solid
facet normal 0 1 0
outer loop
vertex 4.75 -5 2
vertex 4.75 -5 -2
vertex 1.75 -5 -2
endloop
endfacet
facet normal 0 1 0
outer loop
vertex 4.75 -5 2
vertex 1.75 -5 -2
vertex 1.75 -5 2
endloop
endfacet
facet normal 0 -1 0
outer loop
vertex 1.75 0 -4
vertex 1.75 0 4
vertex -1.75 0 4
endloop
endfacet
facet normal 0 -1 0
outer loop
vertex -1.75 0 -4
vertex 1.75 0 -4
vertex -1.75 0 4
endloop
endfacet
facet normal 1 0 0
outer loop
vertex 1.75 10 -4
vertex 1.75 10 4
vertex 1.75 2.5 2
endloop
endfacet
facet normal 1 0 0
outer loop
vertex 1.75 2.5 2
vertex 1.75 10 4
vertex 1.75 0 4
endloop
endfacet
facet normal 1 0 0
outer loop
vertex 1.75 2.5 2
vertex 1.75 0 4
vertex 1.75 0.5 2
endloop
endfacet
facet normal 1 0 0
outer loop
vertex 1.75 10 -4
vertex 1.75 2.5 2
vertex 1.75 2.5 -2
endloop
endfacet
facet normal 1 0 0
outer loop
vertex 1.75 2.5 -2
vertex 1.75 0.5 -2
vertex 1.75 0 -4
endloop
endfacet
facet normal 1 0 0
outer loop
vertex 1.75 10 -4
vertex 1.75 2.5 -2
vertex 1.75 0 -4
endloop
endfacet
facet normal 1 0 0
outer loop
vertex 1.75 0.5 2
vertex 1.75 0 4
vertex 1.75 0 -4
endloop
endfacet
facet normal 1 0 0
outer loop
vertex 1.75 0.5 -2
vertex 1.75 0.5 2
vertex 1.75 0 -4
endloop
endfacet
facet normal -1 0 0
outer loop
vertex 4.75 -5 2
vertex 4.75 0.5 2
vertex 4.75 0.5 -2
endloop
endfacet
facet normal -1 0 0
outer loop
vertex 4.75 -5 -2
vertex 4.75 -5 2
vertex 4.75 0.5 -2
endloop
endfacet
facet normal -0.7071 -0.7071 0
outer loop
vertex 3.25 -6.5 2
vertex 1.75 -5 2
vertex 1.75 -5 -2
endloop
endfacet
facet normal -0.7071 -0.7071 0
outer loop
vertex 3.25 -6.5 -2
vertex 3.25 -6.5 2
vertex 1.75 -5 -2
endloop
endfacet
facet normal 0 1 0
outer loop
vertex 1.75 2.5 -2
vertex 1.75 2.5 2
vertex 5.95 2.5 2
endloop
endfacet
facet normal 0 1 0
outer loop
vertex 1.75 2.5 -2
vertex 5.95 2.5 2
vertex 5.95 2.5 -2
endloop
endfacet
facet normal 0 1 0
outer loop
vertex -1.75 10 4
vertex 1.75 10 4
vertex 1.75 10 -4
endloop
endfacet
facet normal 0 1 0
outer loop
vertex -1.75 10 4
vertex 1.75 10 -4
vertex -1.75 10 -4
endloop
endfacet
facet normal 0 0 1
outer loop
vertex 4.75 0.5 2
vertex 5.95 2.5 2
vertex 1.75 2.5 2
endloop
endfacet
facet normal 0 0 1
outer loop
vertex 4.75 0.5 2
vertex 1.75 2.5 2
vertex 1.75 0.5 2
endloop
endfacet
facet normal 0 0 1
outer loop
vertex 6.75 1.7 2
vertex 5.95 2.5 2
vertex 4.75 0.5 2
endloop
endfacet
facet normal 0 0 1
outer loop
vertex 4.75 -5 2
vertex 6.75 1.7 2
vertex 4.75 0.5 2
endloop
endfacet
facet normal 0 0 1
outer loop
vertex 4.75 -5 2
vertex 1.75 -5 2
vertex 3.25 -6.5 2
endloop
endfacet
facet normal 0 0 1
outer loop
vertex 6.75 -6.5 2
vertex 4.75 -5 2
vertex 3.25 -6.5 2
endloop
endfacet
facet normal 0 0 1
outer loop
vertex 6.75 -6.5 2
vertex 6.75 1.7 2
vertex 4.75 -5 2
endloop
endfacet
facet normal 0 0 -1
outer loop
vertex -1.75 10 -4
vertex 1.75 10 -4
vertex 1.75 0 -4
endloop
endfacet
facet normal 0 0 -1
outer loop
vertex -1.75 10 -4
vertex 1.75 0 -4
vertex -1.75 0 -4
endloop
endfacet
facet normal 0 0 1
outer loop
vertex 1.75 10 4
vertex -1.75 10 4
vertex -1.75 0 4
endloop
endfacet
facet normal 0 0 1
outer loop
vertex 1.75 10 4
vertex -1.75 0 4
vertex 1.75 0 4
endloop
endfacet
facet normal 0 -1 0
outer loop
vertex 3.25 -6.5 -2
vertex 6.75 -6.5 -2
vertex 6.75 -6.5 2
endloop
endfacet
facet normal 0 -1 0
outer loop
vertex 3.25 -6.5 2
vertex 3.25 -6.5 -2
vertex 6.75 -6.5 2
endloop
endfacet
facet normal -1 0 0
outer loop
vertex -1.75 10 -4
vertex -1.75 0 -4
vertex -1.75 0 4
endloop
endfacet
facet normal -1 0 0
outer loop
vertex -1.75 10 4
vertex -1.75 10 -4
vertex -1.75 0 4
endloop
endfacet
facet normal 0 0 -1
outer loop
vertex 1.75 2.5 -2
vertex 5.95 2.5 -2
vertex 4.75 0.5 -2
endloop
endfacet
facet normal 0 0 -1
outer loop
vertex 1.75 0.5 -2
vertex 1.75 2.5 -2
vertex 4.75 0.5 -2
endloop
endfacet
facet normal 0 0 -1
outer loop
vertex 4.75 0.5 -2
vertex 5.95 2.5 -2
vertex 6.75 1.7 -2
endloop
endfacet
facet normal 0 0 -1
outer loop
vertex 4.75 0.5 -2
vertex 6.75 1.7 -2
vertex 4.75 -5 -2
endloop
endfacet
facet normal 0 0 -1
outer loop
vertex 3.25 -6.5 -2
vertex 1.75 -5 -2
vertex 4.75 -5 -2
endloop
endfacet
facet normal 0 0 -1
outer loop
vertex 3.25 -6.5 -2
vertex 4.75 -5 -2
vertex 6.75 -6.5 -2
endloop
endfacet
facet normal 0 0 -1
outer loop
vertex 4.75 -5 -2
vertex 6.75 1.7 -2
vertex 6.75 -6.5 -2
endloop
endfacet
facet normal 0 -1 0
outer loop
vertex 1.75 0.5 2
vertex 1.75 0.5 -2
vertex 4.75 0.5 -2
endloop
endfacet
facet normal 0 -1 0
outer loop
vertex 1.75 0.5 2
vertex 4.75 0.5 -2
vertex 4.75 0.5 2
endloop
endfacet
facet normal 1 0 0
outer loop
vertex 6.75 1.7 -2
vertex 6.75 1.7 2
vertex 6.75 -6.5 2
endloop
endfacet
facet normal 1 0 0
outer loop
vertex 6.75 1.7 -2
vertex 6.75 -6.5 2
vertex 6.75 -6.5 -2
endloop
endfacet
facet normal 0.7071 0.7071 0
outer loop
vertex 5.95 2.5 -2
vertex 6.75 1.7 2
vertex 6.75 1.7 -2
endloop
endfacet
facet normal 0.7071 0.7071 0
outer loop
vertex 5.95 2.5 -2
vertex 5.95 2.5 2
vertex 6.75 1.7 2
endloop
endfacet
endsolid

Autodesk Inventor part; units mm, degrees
ref_plane "YZ Plane" through (0, 0, 0) normal (1, 0, 0) x (0, 1, 0)
ref_plane "XZ Plane" through (0, 0, 0) normal (0, 1, 0) x (-1, 0, 0)
ref_plane "XY Plane" through (0, 0, 0) normal (0, 0, 1) x (1, 0, 0)
sketch "Sketch1" plane through (0, 0, 0) normal (0, 1, 0) x (-1, 0, 0)
  line L0 (-1.75, -4) -> (1.75, -4)
  line L1 (1.75, -4) -> (1.75, 4)
  line L2 (1.75, 4) -> (-1.75, 4)
  line L3 (-1.75, 4) -> (-1.75, -4)
  line L4 (-1.75, -4) -> (1.75, 4) construction
  line L5 (1.75, -4) -> (-1.75, 4) construction
  point P0 (0, 0)
  dimension "d0" = 3.5
  dimension "d1" = 8
extrude "Extrusion1" add sketch "Sketch1" along normal blind 10
sketch "Sketch2" plane through (1.75, 0, 4) normal (1, 0, 0) x (0, 0, -1)
  line L0 (2, 2.5) -> (6, 2.5)
  line L1 (6, 2.5) -> (6, 0.5)
  line L2 (6, 0.5) -> (2, 0.5)
  line L3 (2, 0.5) -> (2, 2.5)
  line L4 (8, 0) -> (8, 10) projected
  line L5 (0, 0) -> (8, 0) projected
  point P0 (4, 0)
  dimension "d4" = 2
  dimension "d5" = 4
  dimension "d6" = 2
  dimension "d7" = 0.5
extrude "Extrusion2" add sketch "Sketch2" along normal blind 5
sketch "Sketch3" plane through (1.75, 0.5, -2) normal (0, -1, 0) x (1, 0, 0)
  line L0 (5, 4) -> (5, 0) projected
  line L1 (0, 0) -> (5, 0) projected
  line L2 (5, 4) -> (3, 4)
  line L3 (3, 4) -> (3, 0)
  line L4 (3, 0) -> (5, 0)
  line L5 (5, 0) -> (5, 4)
  point P0 (-1.75, 2)
  dimension "d22" = 2
extrude "Extrusion3" add sketch "Sketch3" along normal blind 7
chamfer "Chamfer1" distance 0.8 angle 45 1 edges at (6.75, 2.5, 0)
sketch "Sketch6" plane through (4.75, 0.5, -2) normal (-1, 0, 0) x (0, 0, 1)
  line L0 (0, -7) -> (4, -7) projected
  line L1 (0, 0) -> (0, -7) projected
  line L2 (4, -7) -> (0, -7)
  line L3 (0, -7) -> (0, -5.5)
  line L4 (0, -5.5) -> (4, -5.5)
  line L5 (4, -5.5) -> (4, -7)
  point P0 (2, -0.5)
  dimension "d23" = 1.5
extrude "Extrusion6" add sketch "Sketch6" along normal blind 3
chamfer "Chamfer2" distance 1.5 angle 45 1 edges at (1.75, -6.5, 0)
properties part number "prueba_up"
